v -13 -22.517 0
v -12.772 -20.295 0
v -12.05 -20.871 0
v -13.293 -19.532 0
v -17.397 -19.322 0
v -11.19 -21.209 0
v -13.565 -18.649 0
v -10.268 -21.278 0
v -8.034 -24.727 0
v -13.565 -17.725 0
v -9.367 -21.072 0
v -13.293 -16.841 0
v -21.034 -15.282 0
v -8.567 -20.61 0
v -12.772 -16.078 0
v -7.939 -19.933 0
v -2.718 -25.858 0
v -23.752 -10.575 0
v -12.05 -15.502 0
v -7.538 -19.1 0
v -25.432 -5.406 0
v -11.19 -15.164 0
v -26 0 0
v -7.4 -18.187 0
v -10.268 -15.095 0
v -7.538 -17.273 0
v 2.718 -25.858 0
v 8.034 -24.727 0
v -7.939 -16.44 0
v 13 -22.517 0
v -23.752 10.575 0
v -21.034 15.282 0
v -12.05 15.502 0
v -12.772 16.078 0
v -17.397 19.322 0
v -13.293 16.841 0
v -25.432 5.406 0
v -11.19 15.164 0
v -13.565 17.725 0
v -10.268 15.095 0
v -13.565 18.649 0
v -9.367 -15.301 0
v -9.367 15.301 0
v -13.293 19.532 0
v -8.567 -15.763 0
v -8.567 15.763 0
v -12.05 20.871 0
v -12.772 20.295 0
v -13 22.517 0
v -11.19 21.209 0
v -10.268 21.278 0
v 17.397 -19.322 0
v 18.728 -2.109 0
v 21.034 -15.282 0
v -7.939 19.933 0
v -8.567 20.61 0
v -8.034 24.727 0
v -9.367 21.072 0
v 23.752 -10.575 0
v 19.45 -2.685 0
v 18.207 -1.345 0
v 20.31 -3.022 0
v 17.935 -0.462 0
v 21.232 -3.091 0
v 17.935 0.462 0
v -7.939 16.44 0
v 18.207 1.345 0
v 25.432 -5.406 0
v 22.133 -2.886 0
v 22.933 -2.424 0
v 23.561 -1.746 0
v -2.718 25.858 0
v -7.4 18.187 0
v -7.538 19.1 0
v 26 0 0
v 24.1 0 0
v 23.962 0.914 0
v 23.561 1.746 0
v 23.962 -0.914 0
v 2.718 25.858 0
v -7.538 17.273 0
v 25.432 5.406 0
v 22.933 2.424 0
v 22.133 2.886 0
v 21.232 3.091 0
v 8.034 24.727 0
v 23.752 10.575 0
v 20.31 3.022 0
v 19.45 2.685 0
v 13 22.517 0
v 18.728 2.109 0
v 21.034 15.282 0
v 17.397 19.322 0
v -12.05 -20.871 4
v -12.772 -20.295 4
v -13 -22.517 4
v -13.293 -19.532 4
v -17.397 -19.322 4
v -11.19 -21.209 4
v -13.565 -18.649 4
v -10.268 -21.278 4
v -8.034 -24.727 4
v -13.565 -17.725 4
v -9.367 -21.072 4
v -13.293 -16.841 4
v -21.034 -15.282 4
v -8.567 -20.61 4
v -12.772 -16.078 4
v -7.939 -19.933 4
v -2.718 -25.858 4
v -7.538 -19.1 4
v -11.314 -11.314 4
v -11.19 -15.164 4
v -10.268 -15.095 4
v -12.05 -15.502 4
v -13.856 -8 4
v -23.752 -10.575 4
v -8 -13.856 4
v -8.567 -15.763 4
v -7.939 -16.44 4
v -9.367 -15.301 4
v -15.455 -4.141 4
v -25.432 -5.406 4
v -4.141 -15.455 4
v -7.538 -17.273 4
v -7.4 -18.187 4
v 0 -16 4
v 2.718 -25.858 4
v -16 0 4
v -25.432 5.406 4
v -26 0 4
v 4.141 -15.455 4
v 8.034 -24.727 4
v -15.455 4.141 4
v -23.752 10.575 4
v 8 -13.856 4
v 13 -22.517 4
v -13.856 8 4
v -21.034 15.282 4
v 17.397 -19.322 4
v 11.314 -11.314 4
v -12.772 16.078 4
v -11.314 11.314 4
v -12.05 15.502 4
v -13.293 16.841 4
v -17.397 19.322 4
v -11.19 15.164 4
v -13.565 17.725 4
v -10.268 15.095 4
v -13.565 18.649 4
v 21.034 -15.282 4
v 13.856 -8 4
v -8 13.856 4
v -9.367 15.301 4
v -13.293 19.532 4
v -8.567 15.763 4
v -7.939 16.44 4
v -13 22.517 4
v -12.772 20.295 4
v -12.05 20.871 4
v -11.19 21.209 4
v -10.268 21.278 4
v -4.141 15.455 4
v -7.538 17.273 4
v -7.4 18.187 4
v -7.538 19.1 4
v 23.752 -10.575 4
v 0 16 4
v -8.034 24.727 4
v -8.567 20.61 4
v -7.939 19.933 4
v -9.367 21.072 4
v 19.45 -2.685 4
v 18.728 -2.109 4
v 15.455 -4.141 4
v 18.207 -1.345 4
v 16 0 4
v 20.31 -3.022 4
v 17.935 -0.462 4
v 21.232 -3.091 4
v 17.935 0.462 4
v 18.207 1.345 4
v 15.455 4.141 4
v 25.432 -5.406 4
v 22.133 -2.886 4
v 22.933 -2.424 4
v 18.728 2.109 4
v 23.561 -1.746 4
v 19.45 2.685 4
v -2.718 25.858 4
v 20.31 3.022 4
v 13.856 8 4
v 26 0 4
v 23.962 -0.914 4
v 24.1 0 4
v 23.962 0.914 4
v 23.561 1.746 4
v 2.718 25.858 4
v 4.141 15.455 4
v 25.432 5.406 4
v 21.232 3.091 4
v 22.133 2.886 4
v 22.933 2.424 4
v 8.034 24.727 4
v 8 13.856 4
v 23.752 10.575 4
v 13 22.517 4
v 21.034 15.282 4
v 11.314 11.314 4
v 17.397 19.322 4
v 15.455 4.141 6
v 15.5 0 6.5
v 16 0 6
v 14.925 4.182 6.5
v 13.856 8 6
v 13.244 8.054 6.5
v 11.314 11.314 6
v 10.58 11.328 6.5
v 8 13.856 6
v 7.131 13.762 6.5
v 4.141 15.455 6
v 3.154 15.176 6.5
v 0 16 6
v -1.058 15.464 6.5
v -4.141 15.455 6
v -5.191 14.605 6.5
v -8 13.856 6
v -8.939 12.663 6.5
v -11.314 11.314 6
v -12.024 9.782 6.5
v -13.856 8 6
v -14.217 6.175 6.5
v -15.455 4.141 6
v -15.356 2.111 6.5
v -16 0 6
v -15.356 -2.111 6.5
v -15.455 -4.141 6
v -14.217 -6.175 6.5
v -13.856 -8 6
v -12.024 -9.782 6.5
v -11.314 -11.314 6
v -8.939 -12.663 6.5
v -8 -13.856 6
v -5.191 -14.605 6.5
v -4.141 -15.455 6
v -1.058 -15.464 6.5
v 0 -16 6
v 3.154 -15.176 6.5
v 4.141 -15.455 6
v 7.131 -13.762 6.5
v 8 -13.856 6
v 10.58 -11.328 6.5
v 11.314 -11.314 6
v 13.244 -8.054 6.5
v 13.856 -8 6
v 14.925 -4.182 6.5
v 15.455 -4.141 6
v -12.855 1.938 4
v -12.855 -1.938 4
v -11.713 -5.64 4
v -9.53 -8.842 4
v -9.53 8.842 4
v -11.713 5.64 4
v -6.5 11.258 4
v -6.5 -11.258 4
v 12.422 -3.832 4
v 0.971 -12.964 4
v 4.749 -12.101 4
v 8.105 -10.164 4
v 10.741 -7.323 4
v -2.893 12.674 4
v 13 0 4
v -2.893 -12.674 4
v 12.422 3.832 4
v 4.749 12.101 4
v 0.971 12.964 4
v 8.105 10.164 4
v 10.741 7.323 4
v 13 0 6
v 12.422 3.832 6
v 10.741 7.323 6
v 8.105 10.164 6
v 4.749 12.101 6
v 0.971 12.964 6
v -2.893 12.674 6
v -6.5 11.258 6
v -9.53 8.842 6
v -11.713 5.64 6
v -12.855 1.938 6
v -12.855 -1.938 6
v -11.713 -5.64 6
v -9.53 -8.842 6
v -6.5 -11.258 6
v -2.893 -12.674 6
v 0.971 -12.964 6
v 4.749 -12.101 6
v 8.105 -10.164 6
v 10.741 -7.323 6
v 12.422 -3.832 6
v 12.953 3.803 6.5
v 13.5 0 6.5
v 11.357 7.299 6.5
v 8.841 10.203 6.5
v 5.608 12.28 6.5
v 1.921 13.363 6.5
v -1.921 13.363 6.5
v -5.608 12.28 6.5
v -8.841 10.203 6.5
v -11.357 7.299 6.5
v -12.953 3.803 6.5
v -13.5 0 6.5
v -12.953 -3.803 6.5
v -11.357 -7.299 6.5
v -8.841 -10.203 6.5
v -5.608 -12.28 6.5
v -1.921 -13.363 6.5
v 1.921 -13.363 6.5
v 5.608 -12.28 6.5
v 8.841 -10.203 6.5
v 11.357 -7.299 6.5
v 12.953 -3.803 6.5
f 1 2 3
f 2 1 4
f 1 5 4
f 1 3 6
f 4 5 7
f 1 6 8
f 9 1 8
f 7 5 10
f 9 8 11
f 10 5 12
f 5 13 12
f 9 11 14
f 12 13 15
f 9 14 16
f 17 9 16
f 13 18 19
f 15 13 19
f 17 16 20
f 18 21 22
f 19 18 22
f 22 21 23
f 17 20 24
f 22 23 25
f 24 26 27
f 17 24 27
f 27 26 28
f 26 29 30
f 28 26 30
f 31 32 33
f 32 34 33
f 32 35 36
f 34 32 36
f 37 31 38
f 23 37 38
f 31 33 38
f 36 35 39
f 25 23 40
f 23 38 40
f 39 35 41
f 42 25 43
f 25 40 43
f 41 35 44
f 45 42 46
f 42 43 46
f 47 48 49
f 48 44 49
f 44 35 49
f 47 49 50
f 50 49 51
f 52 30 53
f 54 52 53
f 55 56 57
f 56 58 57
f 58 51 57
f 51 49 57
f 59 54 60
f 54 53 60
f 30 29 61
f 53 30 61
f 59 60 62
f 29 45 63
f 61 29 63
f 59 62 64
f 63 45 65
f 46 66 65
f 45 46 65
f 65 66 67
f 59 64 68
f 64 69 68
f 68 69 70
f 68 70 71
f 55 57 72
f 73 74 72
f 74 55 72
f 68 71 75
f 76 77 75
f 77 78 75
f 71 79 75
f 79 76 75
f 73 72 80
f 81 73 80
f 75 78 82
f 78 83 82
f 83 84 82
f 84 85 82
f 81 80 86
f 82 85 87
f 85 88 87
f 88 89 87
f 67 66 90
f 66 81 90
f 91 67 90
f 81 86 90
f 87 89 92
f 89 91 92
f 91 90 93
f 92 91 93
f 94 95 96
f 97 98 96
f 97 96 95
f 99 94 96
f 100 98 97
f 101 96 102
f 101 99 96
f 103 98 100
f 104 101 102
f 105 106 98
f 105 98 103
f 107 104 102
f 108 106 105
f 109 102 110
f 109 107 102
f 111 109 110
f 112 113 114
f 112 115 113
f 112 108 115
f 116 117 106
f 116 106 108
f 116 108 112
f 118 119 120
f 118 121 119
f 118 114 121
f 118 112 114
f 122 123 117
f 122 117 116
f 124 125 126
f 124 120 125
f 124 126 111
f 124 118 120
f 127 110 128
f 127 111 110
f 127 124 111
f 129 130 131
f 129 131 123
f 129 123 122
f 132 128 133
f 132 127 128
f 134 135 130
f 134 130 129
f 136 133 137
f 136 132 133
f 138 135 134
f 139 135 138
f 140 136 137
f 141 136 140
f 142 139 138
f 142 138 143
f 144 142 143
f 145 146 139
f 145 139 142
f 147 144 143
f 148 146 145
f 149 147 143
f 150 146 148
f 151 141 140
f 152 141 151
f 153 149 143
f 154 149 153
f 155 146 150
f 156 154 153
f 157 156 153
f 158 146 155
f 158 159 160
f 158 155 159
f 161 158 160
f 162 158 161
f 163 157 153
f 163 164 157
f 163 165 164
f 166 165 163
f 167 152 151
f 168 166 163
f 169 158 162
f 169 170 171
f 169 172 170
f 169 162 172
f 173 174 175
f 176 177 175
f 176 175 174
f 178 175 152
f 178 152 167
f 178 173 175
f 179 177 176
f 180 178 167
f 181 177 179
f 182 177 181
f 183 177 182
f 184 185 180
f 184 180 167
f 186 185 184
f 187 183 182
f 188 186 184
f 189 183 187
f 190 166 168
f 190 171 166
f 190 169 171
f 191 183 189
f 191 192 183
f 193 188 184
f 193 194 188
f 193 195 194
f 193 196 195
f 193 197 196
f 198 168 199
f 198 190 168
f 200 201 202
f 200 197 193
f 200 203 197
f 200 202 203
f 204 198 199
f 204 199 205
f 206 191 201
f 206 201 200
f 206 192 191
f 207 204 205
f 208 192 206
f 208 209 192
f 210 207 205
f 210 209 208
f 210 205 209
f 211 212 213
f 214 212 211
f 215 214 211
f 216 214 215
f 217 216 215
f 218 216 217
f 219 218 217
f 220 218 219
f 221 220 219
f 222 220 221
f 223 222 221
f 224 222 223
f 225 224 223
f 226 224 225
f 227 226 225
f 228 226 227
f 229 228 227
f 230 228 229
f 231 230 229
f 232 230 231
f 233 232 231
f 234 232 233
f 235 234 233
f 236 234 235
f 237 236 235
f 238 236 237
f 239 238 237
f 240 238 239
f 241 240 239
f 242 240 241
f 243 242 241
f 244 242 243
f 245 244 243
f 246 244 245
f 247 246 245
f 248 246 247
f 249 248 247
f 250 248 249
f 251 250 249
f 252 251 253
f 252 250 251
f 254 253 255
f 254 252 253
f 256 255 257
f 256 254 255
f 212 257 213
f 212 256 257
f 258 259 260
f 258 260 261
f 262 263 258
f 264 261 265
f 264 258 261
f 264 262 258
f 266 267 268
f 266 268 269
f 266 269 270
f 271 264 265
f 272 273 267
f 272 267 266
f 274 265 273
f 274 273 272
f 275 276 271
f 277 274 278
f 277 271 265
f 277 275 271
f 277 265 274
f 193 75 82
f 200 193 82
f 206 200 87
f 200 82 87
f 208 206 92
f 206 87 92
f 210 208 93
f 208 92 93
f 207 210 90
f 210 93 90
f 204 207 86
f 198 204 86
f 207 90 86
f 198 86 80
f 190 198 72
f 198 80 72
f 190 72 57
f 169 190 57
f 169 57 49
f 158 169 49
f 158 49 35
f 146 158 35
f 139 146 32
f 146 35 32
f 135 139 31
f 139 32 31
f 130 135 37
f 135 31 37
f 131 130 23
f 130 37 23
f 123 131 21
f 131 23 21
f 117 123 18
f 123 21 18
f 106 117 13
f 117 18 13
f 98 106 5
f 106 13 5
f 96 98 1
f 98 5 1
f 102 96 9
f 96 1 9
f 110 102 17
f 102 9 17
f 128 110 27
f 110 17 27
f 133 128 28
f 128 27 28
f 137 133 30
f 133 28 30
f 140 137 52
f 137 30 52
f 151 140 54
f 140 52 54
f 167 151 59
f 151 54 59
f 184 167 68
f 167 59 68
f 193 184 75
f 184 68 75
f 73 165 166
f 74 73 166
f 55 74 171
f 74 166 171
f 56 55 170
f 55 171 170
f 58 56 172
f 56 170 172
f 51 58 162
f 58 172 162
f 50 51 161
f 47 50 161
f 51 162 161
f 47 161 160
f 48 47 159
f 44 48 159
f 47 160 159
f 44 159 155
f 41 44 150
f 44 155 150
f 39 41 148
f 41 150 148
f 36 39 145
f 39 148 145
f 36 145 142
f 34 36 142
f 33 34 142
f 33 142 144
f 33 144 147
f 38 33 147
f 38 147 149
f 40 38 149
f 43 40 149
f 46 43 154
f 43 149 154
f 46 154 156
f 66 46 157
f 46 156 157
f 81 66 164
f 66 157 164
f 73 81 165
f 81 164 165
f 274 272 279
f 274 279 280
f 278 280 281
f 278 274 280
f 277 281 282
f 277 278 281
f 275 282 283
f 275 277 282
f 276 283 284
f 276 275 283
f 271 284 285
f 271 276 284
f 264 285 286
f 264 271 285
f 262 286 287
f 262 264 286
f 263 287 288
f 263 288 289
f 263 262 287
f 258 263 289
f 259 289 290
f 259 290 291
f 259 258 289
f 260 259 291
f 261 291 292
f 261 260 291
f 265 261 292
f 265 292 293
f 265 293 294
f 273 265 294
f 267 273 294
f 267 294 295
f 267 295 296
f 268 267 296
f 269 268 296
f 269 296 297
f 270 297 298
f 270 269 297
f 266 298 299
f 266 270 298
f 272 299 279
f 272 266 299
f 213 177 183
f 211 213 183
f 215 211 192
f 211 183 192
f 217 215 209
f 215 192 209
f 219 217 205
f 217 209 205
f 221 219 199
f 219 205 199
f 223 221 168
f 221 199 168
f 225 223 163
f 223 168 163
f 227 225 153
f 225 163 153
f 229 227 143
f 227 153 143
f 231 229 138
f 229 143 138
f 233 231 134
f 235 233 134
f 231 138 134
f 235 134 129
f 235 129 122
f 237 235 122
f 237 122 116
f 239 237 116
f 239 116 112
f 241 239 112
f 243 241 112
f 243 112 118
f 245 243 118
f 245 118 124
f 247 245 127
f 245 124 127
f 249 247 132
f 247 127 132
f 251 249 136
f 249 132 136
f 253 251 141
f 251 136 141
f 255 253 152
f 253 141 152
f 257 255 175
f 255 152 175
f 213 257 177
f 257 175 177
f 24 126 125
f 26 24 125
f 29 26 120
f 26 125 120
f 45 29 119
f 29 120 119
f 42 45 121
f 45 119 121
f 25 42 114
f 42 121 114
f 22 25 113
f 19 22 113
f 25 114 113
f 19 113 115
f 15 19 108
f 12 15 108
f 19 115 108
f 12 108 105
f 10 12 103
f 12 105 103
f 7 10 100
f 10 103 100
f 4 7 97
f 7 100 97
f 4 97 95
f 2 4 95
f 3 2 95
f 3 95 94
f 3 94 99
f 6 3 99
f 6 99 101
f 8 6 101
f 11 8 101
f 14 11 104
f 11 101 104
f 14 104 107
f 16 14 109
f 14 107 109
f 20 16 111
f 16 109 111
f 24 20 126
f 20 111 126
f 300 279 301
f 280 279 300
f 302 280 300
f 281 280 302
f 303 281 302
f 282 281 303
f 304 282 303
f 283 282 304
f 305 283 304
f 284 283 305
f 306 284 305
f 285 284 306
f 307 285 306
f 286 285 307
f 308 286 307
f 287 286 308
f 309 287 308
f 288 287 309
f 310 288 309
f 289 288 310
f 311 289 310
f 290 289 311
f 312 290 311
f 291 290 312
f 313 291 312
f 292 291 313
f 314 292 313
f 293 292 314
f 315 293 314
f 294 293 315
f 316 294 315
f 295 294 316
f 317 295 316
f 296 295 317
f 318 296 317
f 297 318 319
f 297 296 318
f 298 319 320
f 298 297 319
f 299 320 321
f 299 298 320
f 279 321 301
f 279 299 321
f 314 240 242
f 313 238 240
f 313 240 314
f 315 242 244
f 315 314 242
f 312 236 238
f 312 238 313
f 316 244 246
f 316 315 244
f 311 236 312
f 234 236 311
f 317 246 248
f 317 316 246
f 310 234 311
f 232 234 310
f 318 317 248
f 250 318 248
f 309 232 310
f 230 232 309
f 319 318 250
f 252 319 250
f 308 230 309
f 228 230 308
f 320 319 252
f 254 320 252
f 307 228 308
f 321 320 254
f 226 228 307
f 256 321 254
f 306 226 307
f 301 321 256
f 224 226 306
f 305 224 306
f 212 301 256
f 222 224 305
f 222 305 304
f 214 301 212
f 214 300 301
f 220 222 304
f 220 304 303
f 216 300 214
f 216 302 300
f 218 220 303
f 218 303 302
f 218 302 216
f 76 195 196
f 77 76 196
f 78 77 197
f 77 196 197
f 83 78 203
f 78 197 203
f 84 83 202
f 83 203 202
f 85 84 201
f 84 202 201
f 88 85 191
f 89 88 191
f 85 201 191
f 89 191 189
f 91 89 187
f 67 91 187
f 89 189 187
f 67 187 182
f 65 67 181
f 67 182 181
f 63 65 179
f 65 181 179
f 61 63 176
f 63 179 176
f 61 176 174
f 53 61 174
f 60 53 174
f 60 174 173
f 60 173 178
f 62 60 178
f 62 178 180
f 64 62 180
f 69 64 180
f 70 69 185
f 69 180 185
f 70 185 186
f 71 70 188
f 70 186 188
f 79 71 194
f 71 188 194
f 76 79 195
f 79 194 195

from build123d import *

# Parameters (mm, degrees)
SKETCH1_R           = 26
BOSS_EXTRUDE1_DEPTH = 4
SKETCH2_R           = 3.1
CUT_EXTRUDE1_DEPTH  = 4
SKETCH4_R           = 16
SKETCH4_R_2         = 13
BOSS_EXTRUDE2_DEPTH = 2.5
CHAMFER1_SIZE       = 0.5
CHAMFER2_SIZE       = 0.5


with BuildPart() as part:
    # Sketch1 → Boss-Extrude1 (new body)
    with BuildSketch(Plane.XY):
        Circle(SKETCH1_R)
    extrude(amount=BOSS_EXTRUDE1_DEPTH)

    # Sketch2 → Cut-Extrude1 (cut)
    with BuildSketch(Plane.XY.offset(4)):
        with Locations((21, 0)):
            Circle(SKETCH2_R)
        with Locations((-10.5, -18.186533479)):
            Circle(SKETCH2_R)
        with Locations((-10.5, 18.186533479)):
            Circle(SKETCH2_R)
    extrude(amount=-CUT_EXTRUDE1_DEPTH, mode=Mode.SUBTRACT)

    # Sketch4 → Boss-Extrude2 (add)
    with BuildSketch(Plane.XY.offset(4)):
        Circle(SKETCH4_R)
        Circle(SKETCH4_R_2, mode=Mode.SUBTRACT)
    extrude(amount=BOSS_EXTRUDE2_DEPTH)

    # Chamfer1
    chamfer1_edges = [part.edges().sort_by_distance(p)[0] for p in [
        (-16, 0, 6.5),
    ]]
    chamfer(chamfer1_edges, length=CHAMFER1_SIZE)

    # Chamfer2
    chamfer2_edges = [part.edges().sort_by_distance(p)[0] for p in [
        (-13, 0, 6.5),
    ]]
    chamfer(chamfer2_edges, length=CHAMFER2_SIZE)


solid = part.part
